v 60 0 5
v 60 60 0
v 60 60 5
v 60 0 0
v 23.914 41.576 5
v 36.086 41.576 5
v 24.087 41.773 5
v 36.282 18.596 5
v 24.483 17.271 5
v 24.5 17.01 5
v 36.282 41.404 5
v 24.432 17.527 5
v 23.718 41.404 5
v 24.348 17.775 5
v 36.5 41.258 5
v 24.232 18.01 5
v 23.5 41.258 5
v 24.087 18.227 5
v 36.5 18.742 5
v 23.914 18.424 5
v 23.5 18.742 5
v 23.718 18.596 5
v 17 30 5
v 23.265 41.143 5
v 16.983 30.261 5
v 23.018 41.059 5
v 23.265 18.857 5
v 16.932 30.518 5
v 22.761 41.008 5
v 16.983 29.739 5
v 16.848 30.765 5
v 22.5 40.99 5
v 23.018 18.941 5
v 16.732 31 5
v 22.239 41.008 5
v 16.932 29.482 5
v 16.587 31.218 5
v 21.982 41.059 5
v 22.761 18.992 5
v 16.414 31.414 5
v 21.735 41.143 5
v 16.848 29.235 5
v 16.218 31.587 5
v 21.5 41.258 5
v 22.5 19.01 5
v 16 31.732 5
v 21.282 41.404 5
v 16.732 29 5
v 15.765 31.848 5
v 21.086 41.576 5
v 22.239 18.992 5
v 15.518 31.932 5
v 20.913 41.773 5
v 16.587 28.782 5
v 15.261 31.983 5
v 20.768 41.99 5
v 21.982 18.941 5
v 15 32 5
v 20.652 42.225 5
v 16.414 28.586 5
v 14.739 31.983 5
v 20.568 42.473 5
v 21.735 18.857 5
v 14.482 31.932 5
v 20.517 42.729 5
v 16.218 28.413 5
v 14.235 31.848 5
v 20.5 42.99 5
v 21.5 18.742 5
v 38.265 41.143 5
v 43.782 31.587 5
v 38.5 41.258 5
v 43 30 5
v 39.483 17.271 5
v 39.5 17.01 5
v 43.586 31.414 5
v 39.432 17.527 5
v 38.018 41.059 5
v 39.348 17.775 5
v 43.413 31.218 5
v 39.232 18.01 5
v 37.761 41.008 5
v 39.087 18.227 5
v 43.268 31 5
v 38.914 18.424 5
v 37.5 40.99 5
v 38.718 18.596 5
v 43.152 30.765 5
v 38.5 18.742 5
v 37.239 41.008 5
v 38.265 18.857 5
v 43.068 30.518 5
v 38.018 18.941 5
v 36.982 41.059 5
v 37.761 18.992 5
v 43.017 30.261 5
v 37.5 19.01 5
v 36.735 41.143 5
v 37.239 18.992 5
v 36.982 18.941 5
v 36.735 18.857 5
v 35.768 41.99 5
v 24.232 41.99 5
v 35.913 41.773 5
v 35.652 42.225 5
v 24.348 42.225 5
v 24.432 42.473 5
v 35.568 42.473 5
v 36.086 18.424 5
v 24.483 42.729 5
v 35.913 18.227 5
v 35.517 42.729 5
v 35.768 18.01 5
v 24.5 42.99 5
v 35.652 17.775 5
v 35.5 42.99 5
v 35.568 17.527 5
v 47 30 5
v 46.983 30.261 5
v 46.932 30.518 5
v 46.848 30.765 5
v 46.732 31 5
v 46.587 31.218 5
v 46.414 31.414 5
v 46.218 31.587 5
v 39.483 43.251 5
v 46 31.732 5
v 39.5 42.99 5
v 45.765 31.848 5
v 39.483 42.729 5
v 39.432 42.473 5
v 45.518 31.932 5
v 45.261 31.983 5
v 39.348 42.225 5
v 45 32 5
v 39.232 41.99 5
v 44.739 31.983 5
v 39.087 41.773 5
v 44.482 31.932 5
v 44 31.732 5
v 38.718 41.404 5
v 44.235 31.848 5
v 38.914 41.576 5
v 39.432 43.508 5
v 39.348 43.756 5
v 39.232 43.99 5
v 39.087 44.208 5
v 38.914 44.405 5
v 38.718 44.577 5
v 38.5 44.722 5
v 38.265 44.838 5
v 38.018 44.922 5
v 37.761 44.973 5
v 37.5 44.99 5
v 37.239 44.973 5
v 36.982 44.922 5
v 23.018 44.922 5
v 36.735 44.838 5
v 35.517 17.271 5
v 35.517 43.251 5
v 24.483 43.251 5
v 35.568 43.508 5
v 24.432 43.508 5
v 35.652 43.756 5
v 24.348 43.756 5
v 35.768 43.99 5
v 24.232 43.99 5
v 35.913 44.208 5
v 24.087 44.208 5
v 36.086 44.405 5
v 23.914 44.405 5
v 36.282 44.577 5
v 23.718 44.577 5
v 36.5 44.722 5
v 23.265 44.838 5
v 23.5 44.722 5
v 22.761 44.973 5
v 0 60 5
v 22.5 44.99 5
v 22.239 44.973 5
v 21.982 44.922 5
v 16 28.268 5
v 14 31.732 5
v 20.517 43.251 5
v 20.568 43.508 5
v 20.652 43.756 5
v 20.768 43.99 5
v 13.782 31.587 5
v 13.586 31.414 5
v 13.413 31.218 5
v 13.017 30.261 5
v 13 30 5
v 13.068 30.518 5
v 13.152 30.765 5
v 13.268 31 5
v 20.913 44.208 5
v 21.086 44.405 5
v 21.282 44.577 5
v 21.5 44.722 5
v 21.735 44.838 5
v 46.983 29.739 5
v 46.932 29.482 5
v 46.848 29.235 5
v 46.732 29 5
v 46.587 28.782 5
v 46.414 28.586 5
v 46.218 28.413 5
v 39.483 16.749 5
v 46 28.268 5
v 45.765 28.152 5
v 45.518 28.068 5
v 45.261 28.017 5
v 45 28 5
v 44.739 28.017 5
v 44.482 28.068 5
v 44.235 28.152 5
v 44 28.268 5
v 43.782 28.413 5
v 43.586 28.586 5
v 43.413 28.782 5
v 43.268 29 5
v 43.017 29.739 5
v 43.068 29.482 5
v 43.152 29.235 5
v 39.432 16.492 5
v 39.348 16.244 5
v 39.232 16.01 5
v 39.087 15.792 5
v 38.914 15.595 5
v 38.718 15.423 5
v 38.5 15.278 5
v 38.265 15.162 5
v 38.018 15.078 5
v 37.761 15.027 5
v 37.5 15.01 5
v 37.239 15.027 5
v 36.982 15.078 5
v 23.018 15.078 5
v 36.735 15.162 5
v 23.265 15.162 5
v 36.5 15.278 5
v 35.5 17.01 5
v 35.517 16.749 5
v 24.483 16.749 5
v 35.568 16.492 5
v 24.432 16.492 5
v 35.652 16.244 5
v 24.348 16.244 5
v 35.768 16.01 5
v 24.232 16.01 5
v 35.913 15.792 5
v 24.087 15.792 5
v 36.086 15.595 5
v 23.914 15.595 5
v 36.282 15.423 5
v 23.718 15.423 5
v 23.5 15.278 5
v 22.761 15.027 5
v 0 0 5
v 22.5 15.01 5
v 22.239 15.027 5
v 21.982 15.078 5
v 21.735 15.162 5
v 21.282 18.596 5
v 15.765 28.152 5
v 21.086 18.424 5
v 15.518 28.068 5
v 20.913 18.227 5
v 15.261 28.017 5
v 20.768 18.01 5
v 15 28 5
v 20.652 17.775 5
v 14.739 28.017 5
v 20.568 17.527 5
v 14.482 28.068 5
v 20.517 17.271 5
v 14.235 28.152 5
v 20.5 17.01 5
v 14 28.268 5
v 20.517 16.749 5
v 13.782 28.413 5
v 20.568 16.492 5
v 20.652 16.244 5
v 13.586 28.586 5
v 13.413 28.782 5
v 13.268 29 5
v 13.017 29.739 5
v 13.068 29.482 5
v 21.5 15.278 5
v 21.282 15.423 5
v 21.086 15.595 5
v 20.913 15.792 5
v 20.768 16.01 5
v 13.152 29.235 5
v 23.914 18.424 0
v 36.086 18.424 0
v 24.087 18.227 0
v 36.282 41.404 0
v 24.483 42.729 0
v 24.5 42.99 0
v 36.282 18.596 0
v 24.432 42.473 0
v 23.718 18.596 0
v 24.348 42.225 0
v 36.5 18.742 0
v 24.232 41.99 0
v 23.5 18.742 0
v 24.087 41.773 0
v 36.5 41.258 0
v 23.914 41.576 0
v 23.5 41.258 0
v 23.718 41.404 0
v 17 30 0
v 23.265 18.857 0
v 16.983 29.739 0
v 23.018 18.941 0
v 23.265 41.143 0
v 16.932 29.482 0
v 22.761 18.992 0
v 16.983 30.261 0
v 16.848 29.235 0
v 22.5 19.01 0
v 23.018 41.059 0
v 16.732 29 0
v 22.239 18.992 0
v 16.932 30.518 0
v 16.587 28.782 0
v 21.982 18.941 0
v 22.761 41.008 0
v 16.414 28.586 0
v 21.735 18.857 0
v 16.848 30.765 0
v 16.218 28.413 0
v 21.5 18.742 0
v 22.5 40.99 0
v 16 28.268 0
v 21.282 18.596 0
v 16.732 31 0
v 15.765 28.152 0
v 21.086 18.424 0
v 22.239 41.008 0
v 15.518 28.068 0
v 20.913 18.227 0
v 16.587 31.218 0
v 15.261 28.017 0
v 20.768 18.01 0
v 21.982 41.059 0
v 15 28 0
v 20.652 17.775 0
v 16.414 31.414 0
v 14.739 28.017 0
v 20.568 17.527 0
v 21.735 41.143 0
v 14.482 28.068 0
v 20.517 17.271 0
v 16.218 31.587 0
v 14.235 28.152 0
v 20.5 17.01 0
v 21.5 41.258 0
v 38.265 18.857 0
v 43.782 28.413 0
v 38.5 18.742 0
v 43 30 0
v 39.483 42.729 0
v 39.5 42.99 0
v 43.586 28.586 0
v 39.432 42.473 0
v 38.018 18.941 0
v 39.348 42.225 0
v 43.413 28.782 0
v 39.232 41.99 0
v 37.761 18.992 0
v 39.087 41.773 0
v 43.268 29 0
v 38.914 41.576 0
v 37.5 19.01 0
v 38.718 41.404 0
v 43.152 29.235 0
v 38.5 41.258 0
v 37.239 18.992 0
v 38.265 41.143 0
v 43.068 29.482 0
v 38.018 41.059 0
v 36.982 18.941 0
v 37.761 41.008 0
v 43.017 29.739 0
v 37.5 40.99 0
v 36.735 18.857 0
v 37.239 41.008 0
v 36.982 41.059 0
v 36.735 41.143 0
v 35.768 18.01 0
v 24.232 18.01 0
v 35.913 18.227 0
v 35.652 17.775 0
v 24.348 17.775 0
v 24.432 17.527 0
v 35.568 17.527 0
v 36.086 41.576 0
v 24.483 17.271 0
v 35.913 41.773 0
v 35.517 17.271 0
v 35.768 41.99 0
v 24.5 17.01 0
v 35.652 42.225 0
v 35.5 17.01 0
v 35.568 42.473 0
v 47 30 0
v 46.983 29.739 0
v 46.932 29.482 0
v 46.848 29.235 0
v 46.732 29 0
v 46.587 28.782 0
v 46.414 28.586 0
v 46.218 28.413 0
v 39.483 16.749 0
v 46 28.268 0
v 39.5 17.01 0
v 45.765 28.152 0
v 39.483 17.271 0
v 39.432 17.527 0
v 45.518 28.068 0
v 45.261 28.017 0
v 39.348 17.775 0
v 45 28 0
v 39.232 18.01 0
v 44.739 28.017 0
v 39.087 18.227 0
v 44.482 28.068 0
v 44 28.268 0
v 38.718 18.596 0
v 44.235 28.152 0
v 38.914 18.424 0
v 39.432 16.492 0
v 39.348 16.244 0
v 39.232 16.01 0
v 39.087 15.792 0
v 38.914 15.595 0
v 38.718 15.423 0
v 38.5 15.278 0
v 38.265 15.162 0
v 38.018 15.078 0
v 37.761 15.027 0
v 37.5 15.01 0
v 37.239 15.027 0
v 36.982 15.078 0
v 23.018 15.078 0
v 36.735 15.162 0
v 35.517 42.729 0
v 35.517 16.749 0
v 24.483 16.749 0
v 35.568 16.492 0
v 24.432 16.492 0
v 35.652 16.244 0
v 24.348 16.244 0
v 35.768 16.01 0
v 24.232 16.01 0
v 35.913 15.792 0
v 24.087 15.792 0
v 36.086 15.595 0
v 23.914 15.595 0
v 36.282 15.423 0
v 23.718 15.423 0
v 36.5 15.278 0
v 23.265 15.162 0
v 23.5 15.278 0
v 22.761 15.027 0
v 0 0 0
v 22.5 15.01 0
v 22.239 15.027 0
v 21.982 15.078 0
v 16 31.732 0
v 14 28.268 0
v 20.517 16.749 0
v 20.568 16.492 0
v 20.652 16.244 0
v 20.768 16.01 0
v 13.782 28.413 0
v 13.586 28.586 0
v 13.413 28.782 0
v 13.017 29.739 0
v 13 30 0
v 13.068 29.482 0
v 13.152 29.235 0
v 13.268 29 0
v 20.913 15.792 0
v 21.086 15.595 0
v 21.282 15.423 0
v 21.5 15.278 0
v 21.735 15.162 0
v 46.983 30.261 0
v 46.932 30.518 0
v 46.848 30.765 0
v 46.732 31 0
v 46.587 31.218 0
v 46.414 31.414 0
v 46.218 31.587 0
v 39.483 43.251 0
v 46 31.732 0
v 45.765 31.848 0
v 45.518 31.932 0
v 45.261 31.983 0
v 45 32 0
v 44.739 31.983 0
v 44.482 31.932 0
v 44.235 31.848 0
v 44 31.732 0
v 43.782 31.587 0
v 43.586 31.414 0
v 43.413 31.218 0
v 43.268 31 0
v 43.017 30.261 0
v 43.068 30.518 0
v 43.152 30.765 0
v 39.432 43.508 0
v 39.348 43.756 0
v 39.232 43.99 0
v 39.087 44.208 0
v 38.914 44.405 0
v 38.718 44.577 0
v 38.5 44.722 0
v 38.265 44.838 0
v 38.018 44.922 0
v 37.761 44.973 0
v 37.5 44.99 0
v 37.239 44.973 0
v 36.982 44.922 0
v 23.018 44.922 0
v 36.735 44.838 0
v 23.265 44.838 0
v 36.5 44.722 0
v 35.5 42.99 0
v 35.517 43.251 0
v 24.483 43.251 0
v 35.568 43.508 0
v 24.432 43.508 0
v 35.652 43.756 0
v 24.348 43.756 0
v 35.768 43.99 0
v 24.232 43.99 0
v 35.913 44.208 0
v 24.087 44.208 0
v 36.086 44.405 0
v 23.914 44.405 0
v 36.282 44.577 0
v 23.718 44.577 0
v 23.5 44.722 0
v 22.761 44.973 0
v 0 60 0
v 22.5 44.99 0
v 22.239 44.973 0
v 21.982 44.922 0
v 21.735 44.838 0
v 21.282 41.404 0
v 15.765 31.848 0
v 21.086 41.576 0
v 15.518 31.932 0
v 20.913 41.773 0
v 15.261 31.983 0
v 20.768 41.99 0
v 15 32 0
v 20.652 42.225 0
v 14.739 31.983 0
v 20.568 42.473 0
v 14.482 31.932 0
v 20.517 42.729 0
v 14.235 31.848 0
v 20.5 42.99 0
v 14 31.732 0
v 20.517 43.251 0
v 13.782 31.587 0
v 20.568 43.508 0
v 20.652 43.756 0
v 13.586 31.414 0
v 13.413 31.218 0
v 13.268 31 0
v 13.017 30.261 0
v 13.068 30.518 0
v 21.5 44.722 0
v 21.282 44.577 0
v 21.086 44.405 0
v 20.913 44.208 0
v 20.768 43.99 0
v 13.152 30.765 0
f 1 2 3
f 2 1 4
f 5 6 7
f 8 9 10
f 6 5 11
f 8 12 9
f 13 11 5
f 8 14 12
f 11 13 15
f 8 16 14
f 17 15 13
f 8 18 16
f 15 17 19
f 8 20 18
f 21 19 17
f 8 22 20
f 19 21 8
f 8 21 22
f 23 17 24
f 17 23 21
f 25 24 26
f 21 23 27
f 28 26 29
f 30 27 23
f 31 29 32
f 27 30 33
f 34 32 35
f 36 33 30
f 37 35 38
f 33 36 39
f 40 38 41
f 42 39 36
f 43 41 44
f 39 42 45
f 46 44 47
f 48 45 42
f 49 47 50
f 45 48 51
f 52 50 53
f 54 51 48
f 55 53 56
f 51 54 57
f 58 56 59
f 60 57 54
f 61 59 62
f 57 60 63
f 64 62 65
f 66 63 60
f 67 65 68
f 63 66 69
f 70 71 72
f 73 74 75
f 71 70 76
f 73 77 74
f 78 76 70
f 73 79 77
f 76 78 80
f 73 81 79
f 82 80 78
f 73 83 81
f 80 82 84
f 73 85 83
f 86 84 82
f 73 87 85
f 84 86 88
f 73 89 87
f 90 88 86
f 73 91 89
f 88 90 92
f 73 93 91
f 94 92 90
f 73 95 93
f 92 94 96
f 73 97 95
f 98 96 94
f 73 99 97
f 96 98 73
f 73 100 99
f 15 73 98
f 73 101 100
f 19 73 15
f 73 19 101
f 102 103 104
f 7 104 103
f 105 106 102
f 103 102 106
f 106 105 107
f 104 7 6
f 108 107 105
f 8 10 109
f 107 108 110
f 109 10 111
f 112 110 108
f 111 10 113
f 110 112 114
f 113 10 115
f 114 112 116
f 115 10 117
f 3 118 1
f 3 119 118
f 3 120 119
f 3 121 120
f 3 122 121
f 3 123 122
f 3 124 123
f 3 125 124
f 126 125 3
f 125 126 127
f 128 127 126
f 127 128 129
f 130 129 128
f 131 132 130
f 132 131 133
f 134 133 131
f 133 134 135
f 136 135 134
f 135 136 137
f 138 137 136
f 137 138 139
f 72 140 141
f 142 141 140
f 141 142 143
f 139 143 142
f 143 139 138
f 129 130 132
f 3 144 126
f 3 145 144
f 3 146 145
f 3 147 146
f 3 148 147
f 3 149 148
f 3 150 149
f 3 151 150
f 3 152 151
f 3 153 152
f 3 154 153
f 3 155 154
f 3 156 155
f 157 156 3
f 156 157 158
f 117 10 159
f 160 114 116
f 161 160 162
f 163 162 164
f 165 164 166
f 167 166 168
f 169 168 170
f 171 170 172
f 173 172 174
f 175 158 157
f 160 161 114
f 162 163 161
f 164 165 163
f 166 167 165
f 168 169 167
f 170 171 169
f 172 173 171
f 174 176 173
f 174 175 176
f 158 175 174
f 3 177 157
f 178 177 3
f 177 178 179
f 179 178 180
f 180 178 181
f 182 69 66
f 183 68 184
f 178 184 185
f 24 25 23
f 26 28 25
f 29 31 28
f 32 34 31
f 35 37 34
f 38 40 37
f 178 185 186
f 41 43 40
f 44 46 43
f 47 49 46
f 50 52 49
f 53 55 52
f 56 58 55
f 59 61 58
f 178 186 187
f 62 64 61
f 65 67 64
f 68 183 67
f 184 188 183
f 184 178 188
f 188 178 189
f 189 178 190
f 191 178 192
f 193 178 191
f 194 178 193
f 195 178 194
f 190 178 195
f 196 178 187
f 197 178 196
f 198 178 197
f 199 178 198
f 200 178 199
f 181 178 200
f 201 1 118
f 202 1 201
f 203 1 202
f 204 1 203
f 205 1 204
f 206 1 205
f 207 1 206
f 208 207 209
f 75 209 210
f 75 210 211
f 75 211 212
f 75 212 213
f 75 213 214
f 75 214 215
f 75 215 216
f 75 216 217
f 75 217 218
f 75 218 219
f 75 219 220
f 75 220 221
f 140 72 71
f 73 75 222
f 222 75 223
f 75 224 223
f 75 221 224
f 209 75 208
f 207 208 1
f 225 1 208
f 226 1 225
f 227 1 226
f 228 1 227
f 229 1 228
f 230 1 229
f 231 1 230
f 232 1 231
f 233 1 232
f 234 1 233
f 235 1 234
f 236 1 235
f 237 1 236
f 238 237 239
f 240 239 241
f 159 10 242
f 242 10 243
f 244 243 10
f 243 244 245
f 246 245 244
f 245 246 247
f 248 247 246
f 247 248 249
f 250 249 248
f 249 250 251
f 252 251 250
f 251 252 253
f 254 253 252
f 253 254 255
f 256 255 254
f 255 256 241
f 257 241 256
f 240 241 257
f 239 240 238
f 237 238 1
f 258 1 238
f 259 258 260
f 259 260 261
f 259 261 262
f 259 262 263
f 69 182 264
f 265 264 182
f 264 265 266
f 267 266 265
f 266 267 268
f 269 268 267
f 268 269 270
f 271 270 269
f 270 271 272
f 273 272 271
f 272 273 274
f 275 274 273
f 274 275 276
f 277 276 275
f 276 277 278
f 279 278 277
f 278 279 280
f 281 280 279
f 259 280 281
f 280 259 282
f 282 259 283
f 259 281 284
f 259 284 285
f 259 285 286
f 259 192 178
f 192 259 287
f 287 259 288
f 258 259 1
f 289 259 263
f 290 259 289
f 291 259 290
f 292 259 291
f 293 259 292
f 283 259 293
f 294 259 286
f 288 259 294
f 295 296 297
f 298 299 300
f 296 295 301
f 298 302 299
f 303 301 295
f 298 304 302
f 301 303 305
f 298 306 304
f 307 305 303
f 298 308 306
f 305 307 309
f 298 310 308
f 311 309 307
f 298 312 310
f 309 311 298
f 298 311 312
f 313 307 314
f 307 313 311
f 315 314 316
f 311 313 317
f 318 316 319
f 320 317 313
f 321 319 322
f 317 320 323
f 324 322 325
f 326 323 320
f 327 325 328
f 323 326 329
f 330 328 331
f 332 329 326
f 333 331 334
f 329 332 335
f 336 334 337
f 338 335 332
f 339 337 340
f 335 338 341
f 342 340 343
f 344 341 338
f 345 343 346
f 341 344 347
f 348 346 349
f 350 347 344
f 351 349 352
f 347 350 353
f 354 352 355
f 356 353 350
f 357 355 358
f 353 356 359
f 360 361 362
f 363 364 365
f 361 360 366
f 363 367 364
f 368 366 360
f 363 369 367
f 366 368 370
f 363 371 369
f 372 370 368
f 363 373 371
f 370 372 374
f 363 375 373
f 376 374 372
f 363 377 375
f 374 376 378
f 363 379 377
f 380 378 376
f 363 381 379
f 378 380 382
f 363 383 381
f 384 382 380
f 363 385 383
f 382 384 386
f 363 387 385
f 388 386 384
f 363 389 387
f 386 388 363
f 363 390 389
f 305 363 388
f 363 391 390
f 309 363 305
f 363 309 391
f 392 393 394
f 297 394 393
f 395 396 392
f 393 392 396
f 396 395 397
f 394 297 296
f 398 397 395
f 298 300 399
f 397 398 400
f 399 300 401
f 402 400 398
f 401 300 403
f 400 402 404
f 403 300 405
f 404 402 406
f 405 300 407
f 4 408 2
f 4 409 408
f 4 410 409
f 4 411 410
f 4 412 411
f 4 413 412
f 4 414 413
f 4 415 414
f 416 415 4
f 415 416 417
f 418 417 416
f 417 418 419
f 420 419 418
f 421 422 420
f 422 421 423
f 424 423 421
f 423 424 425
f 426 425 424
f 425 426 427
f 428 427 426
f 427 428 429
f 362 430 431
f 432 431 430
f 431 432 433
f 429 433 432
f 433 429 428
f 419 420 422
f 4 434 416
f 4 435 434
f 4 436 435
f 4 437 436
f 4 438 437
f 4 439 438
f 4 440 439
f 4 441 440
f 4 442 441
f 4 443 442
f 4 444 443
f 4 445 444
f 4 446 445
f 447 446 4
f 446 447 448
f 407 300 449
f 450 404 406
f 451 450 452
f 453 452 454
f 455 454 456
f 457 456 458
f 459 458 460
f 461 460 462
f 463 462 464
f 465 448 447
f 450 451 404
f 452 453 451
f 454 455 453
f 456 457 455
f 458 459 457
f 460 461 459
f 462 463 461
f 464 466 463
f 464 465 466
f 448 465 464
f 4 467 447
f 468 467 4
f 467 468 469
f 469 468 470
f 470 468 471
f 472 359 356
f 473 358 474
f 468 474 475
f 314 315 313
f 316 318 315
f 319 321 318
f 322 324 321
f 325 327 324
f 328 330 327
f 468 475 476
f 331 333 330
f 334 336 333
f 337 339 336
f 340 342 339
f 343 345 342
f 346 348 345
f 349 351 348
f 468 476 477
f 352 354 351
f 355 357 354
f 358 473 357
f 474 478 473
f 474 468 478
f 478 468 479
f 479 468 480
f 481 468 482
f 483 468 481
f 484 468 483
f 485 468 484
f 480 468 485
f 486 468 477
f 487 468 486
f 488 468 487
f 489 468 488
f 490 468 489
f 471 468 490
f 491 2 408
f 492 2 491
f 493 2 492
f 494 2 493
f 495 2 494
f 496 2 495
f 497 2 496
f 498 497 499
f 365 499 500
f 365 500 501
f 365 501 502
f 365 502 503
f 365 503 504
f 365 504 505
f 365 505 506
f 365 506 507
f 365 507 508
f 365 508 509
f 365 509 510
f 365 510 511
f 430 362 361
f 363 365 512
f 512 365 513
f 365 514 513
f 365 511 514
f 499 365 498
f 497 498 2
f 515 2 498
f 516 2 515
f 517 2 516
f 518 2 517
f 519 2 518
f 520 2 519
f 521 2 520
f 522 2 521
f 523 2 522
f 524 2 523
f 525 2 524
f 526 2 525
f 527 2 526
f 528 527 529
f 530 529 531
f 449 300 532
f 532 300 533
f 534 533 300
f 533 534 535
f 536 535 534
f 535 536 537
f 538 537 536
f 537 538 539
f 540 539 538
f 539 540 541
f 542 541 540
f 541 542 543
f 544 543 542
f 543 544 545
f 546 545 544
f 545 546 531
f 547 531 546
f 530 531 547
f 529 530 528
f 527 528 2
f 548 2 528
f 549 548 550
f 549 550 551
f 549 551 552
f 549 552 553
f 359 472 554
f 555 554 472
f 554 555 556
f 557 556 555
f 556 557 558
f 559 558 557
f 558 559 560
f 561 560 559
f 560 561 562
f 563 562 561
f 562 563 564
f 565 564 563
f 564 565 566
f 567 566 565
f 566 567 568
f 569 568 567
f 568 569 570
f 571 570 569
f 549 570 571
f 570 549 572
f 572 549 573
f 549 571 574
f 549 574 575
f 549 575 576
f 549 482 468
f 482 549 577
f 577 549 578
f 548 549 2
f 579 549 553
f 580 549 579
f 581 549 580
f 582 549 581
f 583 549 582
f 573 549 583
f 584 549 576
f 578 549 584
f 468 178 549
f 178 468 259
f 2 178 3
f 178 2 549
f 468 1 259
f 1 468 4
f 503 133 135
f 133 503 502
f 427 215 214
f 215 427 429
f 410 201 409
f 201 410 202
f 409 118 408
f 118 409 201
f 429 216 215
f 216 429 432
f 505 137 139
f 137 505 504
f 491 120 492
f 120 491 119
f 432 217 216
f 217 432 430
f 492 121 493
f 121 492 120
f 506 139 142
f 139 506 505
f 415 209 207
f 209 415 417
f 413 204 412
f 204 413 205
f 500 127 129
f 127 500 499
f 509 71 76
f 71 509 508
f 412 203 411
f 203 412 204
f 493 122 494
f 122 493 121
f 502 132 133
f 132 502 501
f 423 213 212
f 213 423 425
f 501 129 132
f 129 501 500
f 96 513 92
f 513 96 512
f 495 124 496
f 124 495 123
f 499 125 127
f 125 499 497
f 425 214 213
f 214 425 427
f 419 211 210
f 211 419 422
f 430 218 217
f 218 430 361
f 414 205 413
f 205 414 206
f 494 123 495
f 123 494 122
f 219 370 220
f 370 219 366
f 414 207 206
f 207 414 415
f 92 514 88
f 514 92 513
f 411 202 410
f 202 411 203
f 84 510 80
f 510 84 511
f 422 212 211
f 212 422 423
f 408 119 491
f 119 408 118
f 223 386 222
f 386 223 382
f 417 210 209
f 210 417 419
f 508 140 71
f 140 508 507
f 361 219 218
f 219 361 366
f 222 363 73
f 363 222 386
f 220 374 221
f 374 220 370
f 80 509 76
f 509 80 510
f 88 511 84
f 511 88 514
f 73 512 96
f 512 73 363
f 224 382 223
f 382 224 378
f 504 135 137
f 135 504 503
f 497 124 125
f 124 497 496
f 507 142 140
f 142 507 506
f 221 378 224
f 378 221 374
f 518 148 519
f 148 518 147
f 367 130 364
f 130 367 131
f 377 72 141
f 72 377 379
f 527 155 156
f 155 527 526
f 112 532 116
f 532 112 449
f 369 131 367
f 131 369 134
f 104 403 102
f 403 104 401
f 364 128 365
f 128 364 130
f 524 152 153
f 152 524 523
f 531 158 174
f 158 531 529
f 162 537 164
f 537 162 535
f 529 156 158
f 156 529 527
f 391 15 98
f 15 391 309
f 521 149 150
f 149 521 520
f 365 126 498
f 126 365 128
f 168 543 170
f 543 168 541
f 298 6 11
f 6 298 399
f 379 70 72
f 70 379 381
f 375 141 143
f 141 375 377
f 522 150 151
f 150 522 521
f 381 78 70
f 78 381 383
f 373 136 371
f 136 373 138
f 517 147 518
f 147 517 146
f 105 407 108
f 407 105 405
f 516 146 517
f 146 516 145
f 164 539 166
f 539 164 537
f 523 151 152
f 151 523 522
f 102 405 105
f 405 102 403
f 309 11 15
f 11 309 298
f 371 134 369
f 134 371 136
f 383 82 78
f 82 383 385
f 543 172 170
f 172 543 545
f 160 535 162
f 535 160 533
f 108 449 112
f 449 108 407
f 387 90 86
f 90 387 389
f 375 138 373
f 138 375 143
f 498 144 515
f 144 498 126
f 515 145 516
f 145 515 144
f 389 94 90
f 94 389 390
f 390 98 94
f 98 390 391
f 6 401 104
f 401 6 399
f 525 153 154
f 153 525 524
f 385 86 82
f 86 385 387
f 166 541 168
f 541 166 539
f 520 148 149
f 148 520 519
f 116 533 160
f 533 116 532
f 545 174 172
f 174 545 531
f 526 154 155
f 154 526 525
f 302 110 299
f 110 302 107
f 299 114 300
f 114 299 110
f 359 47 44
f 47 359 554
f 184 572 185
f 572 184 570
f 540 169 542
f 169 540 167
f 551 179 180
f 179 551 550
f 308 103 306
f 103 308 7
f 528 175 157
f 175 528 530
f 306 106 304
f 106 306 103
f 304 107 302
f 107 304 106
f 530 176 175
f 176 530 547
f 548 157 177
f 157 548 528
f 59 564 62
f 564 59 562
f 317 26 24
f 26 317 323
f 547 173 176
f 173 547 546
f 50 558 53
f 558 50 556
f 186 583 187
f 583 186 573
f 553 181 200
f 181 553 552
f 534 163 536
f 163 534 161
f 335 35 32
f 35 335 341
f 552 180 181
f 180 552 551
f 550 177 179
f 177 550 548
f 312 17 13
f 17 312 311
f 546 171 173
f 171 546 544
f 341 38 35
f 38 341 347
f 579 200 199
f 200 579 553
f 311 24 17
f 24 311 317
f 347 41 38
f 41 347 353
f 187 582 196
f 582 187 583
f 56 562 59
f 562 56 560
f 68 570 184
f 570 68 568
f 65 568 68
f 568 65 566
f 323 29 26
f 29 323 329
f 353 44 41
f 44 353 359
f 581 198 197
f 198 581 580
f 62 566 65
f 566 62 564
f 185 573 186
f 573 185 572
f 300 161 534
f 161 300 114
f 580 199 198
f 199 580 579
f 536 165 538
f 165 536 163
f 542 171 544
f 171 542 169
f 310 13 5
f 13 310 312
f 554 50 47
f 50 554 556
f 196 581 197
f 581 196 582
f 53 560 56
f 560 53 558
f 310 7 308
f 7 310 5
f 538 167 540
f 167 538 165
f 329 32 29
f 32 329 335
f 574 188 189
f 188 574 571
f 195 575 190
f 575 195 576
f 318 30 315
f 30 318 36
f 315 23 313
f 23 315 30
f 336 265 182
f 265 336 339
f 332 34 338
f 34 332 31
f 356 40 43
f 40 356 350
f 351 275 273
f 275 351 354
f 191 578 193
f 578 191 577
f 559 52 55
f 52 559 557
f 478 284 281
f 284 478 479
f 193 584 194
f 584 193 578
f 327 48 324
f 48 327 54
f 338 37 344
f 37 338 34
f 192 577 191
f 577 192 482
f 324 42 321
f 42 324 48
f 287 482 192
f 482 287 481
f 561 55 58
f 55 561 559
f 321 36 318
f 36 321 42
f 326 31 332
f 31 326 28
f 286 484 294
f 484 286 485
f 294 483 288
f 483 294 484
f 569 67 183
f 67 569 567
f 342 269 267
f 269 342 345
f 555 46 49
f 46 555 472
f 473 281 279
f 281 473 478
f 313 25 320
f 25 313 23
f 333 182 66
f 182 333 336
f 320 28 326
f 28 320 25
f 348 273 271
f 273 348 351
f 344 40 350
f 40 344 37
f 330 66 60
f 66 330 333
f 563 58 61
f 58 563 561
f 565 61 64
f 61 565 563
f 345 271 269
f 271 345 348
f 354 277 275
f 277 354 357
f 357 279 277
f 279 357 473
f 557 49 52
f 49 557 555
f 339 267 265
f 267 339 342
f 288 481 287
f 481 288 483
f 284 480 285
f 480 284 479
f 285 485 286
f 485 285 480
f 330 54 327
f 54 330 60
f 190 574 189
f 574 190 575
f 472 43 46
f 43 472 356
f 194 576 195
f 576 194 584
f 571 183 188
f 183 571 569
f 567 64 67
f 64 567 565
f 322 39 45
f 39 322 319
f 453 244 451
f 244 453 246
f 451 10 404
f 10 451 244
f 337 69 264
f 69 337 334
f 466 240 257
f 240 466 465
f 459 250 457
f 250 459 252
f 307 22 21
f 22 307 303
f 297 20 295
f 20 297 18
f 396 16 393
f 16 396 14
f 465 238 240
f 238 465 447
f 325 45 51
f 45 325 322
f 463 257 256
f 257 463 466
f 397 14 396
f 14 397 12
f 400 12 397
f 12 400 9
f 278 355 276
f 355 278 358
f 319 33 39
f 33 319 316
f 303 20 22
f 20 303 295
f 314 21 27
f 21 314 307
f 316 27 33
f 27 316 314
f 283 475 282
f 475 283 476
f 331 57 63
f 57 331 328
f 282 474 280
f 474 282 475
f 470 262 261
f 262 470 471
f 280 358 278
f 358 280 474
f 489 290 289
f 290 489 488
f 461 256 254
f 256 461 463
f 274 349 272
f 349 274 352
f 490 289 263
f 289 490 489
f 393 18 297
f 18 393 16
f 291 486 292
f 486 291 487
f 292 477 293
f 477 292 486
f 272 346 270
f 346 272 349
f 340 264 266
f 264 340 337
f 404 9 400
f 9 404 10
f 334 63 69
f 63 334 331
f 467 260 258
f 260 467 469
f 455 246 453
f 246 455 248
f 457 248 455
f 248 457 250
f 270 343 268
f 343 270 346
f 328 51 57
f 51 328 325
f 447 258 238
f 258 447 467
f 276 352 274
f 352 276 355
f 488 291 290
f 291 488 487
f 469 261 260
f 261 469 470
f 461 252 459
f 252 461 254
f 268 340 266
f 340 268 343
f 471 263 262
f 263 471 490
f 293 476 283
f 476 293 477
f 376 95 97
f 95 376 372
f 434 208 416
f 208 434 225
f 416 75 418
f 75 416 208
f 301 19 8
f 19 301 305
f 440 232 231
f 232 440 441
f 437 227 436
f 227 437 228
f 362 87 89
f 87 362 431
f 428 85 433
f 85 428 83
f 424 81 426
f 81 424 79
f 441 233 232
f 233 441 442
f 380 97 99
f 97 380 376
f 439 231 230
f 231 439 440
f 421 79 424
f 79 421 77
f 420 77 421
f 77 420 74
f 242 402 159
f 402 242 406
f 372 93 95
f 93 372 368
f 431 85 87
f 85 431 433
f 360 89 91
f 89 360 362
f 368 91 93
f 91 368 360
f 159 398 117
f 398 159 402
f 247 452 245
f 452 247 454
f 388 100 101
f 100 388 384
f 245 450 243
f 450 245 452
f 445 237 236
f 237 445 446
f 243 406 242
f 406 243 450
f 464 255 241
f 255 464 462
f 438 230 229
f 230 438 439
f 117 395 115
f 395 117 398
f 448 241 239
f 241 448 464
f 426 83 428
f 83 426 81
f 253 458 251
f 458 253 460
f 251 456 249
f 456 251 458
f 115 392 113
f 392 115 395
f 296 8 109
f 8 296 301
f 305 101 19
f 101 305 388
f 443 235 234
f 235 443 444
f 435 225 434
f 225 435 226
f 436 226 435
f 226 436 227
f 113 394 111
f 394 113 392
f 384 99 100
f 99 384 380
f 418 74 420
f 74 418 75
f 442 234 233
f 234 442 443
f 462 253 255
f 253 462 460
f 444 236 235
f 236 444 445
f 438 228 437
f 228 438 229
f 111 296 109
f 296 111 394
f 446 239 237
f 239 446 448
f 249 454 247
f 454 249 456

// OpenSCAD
// units=mm — generated by scad_emitter.py
// part=unnamed
$fn = 48;

difference() { cube([60, 60, 5]); translate([45, 30, 5.5]) rotate([180, 0, 0]) cylinder(h=6, r=2, $fn=$fn); translate([37.5, 42.9904, 5.5]) rotate([180, 0, 0]) cylinder(h=6, r=2, $fn=$fn); translate([22.5, 42.9904, 5.5]) rotate([180, 0, 0]) cylinder(h=6, r=2, $fn=$fn); translate([15, 30, 5.5]) rotate([180, 0, 0]) cylinder(h=6, r=2, $fn=$fn); translate([22.5, 17.0096, 5.5]) rotate([180, 0, 0]) cylinder(h=6, r=2, $fn=$fn); translate([37.5, 17.0096, 5.5]) rotate([180, 0, 0]) cylinder(h=6, r=2, $fn=$fn); }
